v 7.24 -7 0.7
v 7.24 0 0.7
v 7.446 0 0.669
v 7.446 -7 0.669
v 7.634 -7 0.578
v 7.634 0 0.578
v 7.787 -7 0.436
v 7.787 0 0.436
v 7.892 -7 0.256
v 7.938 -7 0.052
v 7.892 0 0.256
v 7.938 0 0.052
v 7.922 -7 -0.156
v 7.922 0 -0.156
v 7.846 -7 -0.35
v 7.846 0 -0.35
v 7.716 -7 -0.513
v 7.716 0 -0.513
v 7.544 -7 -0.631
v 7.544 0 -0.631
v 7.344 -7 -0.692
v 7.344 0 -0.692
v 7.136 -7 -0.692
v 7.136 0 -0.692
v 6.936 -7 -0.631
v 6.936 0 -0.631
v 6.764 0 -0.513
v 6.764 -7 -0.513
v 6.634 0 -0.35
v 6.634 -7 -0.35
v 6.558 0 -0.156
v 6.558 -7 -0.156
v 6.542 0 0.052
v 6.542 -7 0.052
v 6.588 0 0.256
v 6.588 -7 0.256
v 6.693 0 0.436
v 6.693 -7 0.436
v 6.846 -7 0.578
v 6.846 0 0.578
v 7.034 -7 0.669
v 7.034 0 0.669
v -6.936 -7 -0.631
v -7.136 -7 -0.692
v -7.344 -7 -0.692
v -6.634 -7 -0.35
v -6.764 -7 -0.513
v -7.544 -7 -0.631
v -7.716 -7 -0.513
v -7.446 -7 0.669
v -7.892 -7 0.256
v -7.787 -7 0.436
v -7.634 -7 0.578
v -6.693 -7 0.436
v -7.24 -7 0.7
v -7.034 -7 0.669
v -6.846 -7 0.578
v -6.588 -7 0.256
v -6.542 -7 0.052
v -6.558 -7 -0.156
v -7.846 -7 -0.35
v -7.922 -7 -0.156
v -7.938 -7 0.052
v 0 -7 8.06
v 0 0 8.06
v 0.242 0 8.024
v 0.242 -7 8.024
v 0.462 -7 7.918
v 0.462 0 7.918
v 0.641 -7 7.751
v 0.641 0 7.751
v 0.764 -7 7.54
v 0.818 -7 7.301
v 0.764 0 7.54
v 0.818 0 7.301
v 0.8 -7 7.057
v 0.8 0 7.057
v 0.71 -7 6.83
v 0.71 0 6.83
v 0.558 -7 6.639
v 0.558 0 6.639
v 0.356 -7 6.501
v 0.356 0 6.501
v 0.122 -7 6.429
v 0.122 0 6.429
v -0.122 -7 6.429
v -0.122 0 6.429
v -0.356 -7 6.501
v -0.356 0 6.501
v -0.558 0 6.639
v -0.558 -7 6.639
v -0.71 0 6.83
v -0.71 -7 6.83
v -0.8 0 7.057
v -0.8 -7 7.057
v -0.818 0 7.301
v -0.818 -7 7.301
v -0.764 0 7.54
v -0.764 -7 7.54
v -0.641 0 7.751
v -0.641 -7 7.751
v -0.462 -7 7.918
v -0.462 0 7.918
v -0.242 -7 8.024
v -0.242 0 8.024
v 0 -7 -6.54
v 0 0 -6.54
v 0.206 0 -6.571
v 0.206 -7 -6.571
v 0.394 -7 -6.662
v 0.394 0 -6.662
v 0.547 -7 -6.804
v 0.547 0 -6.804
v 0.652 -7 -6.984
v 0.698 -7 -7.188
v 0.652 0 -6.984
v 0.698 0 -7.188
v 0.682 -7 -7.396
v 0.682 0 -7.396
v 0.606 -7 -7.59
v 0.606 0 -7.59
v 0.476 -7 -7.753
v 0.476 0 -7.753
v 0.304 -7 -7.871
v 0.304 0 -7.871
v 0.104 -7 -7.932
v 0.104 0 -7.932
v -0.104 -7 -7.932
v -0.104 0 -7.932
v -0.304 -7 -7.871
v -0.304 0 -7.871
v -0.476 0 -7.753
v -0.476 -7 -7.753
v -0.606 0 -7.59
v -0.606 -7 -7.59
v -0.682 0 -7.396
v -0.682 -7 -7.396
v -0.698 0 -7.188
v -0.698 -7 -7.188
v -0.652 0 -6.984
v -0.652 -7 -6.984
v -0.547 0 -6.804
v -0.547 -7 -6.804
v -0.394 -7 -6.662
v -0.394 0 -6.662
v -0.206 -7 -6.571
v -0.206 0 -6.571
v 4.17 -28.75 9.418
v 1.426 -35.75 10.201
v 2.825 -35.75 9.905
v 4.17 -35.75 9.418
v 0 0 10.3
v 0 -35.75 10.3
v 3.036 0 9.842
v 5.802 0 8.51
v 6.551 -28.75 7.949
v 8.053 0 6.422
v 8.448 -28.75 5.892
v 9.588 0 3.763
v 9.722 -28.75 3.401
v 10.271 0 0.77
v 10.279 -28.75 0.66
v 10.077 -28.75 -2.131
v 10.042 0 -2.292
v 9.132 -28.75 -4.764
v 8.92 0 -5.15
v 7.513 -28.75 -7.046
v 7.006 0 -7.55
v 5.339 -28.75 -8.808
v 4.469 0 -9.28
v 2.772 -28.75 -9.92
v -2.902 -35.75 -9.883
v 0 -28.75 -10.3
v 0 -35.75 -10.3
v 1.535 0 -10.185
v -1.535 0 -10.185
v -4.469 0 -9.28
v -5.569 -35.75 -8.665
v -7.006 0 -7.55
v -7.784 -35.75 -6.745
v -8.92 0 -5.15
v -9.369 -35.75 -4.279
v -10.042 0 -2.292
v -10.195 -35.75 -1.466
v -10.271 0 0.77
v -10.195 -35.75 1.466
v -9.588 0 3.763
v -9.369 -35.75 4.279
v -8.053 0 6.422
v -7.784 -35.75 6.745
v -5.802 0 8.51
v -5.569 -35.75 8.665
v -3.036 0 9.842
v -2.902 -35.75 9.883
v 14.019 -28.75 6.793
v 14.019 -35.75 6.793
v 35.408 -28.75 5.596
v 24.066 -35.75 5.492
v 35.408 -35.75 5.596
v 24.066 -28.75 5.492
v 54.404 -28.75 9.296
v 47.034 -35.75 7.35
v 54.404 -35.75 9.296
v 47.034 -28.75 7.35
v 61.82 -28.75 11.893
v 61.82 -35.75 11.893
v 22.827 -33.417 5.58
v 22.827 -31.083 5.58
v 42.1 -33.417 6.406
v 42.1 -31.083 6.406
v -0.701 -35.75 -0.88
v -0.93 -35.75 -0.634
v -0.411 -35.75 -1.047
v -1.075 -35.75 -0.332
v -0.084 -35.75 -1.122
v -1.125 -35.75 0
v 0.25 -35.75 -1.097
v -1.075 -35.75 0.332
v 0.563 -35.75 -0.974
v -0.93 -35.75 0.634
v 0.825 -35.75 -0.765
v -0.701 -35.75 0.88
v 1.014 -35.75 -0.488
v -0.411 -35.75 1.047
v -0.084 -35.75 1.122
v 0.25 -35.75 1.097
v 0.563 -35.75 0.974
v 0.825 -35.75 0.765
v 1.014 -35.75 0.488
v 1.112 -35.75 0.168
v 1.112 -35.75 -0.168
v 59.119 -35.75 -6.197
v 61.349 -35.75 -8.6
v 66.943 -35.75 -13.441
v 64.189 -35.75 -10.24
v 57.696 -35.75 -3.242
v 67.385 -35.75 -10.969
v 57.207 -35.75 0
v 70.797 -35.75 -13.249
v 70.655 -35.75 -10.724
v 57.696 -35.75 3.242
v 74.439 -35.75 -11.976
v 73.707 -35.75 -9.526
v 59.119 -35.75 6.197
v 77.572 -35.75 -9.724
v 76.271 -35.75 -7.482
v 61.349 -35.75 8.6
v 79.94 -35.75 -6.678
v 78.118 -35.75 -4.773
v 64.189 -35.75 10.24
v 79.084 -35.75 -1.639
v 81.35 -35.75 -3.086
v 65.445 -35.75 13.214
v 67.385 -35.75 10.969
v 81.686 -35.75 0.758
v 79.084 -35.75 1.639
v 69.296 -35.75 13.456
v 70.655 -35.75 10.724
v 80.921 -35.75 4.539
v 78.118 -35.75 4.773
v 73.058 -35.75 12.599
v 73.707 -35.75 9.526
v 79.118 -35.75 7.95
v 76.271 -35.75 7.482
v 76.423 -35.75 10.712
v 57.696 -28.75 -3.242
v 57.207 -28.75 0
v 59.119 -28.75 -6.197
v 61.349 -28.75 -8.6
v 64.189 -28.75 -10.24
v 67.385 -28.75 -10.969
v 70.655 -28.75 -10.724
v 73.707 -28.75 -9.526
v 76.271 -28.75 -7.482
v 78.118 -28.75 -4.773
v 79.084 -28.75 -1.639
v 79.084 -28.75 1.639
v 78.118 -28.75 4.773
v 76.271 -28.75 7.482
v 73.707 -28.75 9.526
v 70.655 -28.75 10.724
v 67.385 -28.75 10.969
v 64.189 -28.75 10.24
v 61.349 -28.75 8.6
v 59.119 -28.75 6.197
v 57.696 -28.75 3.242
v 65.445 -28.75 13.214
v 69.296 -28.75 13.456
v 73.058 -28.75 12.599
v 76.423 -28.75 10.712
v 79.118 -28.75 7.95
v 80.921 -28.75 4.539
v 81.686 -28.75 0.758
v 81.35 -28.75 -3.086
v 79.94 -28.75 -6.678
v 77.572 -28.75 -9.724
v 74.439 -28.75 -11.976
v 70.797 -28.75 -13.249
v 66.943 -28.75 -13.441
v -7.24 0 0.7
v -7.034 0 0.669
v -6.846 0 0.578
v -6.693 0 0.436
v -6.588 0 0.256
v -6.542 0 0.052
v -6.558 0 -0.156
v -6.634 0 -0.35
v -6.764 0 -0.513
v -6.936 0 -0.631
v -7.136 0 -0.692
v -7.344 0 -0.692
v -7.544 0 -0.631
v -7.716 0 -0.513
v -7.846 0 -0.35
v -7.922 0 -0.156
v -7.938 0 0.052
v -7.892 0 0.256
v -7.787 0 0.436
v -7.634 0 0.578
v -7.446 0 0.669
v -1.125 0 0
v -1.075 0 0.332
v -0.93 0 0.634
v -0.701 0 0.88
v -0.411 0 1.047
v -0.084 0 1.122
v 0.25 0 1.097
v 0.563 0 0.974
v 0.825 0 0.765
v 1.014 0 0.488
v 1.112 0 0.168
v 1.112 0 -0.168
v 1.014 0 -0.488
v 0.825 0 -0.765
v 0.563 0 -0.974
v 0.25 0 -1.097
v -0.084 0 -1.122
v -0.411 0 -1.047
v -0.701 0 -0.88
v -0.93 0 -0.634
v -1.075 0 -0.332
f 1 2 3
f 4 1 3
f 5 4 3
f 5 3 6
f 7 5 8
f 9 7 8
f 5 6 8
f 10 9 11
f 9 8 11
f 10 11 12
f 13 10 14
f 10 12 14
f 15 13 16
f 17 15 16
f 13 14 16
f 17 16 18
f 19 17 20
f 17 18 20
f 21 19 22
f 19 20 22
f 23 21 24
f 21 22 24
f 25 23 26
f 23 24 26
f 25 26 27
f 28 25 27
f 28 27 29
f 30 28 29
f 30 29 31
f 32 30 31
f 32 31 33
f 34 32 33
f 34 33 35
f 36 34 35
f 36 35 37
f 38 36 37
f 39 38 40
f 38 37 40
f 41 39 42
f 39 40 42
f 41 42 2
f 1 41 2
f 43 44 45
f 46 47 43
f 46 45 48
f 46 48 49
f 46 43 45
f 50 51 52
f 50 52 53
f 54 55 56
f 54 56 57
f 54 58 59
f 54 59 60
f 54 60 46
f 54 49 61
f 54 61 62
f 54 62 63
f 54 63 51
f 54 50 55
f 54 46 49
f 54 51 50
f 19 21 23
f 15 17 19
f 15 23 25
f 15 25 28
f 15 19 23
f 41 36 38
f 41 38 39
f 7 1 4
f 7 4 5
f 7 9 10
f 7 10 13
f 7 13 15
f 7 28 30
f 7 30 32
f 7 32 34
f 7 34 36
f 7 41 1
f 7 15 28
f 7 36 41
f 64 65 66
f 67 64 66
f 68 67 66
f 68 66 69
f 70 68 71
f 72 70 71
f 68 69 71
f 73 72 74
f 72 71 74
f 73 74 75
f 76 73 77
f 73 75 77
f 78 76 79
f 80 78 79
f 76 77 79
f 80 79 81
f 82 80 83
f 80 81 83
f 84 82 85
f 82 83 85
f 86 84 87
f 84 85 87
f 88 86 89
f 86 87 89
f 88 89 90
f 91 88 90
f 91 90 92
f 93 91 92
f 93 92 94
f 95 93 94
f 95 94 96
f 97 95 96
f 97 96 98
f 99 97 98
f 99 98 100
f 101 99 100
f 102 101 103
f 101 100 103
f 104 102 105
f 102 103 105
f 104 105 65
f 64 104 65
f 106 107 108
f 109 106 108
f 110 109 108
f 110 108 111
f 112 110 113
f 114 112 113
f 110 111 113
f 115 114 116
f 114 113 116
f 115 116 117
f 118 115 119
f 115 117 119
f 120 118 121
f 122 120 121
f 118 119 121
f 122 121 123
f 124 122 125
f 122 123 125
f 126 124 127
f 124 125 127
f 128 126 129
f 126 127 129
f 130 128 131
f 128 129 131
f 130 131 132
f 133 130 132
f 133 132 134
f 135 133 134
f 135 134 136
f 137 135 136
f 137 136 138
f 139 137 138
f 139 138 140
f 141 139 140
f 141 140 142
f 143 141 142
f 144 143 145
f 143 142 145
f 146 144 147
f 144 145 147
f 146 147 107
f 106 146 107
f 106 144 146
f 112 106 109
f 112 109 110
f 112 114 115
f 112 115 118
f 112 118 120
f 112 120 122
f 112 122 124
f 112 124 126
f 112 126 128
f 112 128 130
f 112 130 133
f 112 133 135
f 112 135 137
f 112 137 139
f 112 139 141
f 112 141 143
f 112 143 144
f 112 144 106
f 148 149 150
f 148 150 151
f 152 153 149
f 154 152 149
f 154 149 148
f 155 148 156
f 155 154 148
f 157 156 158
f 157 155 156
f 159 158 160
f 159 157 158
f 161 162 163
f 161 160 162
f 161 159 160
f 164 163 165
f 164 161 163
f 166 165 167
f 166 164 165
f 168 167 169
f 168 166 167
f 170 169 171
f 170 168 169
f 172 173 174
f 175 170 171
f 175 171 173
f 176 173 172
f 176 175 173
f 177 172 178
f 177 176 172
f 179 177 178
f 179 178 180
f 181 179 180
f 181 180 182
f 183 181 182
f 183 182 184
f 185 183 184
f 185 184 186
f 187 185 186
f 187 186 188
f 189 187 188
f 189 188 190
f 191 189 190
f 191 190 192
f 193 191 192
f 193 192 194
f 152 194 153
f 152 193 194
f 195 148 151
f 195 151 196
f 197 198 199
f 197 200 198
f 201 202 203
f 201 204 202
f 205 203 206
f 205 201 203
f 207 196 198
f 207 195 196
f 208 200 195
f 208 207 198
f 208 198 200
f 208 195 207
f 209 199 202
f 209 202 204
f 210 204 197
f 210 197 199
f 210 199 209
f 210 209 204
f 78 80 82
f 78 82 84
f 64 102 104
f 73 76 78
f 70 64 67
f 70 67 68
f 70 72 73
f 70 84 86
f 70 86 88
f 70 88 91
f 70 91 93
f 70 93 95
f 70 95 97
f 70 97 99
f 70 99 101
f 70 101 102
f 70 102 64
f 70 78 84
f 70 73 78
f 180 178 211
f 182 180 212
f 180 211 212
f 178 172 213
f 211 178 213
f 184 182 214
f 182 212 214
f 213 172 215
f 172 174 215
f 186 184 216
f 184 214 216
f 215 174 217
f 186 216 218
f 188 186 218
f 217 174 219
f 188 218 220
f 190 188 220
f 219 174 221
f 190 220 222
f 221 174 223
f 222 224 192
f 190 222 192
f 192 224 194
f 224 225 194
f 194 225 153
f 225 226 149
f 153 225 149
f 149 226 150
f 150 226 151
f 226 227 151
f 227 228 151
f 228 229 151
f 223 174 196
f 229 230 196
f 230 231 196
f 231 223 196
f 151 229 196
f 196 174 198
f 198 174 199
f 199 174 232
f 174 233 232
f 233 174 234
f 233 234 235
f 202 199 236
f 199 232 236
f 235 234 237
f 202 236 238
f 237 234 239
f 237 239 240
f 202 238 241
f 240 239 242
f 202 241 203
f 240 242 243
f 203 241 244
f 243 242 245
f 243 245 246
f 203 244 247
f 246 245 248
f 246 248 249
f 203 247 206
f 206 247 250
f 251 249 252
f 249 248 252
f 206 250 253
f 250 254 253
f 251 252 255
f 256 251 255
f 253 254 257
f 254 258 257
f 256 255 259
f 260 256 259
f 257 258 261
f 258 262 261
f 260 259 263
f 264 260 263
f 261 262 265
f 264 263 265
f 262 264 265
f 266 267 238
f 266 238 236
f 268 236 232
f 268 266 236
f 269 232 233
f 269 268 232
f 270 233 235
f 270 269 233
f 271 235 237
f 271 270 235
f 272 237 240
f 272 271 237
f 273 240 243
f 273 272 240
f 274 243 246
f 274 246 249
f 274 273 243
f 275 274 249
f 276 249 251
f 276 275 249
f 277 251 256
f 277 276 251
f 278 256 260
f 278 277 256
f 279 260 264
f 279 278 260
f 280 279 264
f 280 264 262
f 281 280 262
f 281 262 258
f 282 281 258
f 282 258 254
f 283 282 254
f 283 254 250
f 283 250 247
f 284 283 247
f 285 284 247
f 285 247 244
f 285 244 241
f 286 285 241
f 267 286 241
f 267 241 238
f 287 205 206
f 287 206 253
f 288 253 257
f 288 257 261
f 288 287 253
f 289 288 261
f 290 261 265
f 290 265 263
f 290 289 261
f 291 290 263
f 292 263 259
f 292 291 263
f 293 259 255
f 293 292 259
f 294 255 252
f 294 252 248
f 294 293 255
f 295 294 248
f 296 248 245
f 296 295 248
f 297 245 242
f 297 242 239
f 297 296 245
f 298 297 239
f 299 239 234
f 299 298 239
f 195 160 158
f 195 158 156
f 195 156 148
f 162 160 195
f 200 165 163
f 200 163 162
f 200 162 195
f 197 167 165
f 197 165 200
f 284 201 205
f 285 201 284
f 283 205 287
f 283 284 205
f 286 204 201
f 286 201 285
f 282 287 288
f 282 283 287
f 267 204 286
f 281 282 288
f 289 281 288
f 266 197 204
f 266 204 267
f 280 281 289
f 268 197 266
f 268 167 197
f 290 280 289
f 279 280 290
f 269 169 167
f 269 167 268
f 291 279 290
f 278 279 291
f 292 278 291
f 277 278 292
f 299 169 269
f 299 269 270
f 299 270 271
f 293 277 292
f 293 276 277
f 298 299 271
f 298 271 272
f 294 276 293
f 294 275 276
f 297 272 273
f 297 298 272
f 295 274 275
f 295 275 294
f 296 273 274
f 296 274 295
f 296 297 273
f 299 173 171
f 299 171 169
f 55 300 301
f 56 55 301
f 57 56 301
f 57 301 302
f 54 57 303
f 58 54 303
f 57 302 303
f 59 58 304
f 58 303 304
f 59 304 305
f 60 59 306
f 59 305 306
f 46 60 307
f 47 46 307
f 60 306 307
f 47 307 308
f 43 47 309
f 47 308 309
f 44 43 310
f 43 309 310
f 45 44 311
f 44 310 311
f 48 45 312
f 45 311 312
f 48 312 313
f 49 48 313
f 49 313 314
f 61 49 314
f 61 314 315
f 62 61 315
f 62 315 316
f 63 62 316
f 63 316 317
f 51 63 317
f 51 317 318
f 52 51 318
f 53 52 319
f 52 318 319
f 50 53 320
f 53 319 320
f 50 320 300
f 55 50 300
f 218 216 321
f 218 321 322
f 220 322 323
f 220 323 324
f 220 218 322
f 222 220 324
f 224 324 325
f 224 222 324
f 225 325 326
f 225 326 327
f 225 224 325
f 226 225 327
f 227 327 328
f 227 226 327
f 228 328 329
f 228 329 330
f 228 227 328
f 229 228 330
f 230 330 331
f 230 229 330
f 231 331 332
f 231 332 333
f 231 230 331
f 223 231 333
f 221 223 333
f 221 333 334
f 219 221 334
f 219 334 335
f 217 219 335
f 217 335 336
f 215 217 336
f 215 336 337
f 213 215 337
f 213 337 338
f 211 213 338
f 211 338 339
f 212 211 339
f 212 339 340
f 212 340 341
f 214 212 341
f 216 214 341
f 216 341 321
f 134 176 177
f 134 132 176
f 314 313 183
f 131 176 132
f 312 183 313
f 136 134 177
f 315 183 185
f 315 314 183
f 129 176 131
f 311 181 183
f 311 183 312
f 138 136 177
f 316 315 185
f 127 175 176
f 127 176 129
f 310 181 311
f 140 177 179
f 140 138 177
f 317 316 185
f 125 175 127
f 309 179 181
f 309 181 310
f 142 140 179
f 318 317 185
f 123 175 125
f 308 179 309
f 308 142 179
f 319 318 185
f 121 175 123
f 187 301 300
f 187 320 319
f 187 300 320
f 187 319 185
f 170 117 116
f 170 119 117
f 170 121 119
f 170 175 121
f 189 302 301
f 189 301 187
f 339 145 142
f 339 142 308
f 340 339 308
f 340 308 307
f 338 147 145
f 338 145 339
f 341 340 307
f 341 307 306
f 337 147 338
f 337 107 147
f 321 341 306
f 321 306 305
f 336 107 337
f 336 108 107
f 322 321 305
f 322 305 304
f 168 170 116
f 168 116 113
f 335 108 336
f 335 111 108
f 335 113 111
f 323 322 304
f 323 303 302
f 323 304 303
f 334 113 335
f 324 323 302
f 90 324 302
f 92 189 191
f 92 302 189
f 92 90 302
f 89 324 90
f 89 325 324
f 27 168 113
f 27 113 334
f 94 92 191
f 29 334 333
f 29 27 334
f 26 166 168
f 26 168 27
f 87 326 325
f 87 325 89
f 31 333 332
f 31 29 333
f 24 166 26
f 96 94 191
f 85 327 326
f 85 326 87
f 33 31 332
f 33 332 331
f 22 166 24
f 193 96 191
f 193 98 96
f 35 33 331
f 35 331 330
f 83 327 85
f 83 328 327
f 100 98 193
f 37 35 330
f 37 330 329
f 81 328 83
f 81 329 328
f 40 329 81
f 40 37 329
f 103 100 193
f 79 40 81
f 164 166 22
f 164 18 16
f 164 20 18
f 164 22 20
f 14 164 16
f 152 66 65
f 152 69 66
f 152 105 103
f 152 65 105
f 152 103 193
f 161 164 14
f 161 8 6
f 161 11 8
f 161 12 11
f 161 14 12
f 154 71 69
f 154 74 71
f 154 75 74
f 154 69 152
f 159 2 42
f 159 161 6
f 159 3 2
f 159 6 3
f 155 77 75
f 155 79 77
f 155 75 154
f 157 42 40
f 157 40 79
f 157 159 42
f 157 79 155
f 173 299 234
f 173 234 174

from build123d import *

# Parameters (mm, degrees)
SZKIC1_R                    = 10.3
DODANIE_WYCI_GNI_CIE1_DEPTH = 35.75
OTWORY_USTALAJ_CE_2_5MM2_D  = 2.25
DODANIE_WYCI_GNI_CIE3_START = -7
DODANIE_WYCI_GNI_CIE3_DEPTH = 7
OTWORY_USTALAJ_CE_2_5MM3_D  = 22
SZKIC12_R                   = 0.7
SZKIC12_R_2                 = 0.820346338
WYTNIJ_WYCI_GNI_CIE1_DEPTH  = 7


with BuildPart() as part:
    # Szkic1 → Dodanie-wyciągnięcie1 (new body)
    with BuildSketch(Plane(origin=(0, 0, 0), x_dir=(1, 0, 0), z_dir=(0, 1, 0))):
        with Locations(Location((0, 0, 0), (0, 0, 270))):
            Circle(SZKIC1_R)
    extrude(amount=DODANIE_WYCI_GNI_CIE1_DEPTH)

    # Otwory ustalające Ø2.5mm2 (through all)
    with Locations(Plane.XZ):
        with Locations((0, 0)):
            Hole(OTWORY_USTALAJ_CE_2_5MM2_D / 2)

    # Szkic7 → Dodanie-wyciągnięcie3 (add)
    with BuildSketch(Plane(origin=(0, 35.75, 0), x_dir=(1, 0, 0), z_dir=(0, 1, 0)).offset(DODANIE_WYCI_GNI_CIE3_START)):
        with BuildLine():
            Line((66.943357066, 13.440701035), (0, 10.3))
            ThreePointArc((0, 10.3), (10.077130906, 2.131063748), (4.169904535, -9.418168408))
            add(Edge.make_bspline(
                [(4.169904535, -9.418168408), (22.461776037, -3.24596138), (41.934151815, -4.077243057), (61.820006497, -11.893378905)],
                knots=[0, 0, 0, 0, 1, 1, 1, 1], degree=3))
            ThreePointArc((61.820006497, -11.893378905), (81.439431711, -2.675954354), (66.943357066, 13.440701035))
        make_face()
    extrude(amount=DODANIE_WYCI_GNI_CIE3_DEPTH)

    # Otwory ustalające Ø2.5mm3 (through all)
    with Locations(Plane(origin=(0, 35.75, 0), x_dir=(1, 0, 0), z_dir=(0, 1, 0))):
        with Locations((68.207301561, 0)):
            Hole(OTWORY_USTALAJ_CE_2_5MM3_D / 2)


with BuildPart() as body_2:
    # Lustro1: mirrored copy
    add(part.part.mirror(Plane.ZX))

    # Szkic12 → Wytnij-wyciągnięcie1 (cut)
    with BuildSketch(Plane(origin=(0, 0, 0), x_dir=(1, 0, 0), z_dir=(0, 1, 0))):
        with Locations(Location((0, 7.24, 0), (0, 0, 270))):
            Circle(SZKIC12_R)
        with Locations(Location((0, -7.24, 0), (0, 0, 270))):
            Circle(SZKIC12_R_2)
        with Locations(Location((7.24, 0, 0), (0, 0, 270))):
            Circle(SZKIC12_R)
        with Locations(Location((-7.24, 0, 0), (0, 0, 270))):
            Circle(SZKIC12_R)
    extrude(amount=-WYTNIJ_WYCI_GNI_CIE1_DEPTH, mode=Mode.SUBTRACT)


solid = body_2.part
